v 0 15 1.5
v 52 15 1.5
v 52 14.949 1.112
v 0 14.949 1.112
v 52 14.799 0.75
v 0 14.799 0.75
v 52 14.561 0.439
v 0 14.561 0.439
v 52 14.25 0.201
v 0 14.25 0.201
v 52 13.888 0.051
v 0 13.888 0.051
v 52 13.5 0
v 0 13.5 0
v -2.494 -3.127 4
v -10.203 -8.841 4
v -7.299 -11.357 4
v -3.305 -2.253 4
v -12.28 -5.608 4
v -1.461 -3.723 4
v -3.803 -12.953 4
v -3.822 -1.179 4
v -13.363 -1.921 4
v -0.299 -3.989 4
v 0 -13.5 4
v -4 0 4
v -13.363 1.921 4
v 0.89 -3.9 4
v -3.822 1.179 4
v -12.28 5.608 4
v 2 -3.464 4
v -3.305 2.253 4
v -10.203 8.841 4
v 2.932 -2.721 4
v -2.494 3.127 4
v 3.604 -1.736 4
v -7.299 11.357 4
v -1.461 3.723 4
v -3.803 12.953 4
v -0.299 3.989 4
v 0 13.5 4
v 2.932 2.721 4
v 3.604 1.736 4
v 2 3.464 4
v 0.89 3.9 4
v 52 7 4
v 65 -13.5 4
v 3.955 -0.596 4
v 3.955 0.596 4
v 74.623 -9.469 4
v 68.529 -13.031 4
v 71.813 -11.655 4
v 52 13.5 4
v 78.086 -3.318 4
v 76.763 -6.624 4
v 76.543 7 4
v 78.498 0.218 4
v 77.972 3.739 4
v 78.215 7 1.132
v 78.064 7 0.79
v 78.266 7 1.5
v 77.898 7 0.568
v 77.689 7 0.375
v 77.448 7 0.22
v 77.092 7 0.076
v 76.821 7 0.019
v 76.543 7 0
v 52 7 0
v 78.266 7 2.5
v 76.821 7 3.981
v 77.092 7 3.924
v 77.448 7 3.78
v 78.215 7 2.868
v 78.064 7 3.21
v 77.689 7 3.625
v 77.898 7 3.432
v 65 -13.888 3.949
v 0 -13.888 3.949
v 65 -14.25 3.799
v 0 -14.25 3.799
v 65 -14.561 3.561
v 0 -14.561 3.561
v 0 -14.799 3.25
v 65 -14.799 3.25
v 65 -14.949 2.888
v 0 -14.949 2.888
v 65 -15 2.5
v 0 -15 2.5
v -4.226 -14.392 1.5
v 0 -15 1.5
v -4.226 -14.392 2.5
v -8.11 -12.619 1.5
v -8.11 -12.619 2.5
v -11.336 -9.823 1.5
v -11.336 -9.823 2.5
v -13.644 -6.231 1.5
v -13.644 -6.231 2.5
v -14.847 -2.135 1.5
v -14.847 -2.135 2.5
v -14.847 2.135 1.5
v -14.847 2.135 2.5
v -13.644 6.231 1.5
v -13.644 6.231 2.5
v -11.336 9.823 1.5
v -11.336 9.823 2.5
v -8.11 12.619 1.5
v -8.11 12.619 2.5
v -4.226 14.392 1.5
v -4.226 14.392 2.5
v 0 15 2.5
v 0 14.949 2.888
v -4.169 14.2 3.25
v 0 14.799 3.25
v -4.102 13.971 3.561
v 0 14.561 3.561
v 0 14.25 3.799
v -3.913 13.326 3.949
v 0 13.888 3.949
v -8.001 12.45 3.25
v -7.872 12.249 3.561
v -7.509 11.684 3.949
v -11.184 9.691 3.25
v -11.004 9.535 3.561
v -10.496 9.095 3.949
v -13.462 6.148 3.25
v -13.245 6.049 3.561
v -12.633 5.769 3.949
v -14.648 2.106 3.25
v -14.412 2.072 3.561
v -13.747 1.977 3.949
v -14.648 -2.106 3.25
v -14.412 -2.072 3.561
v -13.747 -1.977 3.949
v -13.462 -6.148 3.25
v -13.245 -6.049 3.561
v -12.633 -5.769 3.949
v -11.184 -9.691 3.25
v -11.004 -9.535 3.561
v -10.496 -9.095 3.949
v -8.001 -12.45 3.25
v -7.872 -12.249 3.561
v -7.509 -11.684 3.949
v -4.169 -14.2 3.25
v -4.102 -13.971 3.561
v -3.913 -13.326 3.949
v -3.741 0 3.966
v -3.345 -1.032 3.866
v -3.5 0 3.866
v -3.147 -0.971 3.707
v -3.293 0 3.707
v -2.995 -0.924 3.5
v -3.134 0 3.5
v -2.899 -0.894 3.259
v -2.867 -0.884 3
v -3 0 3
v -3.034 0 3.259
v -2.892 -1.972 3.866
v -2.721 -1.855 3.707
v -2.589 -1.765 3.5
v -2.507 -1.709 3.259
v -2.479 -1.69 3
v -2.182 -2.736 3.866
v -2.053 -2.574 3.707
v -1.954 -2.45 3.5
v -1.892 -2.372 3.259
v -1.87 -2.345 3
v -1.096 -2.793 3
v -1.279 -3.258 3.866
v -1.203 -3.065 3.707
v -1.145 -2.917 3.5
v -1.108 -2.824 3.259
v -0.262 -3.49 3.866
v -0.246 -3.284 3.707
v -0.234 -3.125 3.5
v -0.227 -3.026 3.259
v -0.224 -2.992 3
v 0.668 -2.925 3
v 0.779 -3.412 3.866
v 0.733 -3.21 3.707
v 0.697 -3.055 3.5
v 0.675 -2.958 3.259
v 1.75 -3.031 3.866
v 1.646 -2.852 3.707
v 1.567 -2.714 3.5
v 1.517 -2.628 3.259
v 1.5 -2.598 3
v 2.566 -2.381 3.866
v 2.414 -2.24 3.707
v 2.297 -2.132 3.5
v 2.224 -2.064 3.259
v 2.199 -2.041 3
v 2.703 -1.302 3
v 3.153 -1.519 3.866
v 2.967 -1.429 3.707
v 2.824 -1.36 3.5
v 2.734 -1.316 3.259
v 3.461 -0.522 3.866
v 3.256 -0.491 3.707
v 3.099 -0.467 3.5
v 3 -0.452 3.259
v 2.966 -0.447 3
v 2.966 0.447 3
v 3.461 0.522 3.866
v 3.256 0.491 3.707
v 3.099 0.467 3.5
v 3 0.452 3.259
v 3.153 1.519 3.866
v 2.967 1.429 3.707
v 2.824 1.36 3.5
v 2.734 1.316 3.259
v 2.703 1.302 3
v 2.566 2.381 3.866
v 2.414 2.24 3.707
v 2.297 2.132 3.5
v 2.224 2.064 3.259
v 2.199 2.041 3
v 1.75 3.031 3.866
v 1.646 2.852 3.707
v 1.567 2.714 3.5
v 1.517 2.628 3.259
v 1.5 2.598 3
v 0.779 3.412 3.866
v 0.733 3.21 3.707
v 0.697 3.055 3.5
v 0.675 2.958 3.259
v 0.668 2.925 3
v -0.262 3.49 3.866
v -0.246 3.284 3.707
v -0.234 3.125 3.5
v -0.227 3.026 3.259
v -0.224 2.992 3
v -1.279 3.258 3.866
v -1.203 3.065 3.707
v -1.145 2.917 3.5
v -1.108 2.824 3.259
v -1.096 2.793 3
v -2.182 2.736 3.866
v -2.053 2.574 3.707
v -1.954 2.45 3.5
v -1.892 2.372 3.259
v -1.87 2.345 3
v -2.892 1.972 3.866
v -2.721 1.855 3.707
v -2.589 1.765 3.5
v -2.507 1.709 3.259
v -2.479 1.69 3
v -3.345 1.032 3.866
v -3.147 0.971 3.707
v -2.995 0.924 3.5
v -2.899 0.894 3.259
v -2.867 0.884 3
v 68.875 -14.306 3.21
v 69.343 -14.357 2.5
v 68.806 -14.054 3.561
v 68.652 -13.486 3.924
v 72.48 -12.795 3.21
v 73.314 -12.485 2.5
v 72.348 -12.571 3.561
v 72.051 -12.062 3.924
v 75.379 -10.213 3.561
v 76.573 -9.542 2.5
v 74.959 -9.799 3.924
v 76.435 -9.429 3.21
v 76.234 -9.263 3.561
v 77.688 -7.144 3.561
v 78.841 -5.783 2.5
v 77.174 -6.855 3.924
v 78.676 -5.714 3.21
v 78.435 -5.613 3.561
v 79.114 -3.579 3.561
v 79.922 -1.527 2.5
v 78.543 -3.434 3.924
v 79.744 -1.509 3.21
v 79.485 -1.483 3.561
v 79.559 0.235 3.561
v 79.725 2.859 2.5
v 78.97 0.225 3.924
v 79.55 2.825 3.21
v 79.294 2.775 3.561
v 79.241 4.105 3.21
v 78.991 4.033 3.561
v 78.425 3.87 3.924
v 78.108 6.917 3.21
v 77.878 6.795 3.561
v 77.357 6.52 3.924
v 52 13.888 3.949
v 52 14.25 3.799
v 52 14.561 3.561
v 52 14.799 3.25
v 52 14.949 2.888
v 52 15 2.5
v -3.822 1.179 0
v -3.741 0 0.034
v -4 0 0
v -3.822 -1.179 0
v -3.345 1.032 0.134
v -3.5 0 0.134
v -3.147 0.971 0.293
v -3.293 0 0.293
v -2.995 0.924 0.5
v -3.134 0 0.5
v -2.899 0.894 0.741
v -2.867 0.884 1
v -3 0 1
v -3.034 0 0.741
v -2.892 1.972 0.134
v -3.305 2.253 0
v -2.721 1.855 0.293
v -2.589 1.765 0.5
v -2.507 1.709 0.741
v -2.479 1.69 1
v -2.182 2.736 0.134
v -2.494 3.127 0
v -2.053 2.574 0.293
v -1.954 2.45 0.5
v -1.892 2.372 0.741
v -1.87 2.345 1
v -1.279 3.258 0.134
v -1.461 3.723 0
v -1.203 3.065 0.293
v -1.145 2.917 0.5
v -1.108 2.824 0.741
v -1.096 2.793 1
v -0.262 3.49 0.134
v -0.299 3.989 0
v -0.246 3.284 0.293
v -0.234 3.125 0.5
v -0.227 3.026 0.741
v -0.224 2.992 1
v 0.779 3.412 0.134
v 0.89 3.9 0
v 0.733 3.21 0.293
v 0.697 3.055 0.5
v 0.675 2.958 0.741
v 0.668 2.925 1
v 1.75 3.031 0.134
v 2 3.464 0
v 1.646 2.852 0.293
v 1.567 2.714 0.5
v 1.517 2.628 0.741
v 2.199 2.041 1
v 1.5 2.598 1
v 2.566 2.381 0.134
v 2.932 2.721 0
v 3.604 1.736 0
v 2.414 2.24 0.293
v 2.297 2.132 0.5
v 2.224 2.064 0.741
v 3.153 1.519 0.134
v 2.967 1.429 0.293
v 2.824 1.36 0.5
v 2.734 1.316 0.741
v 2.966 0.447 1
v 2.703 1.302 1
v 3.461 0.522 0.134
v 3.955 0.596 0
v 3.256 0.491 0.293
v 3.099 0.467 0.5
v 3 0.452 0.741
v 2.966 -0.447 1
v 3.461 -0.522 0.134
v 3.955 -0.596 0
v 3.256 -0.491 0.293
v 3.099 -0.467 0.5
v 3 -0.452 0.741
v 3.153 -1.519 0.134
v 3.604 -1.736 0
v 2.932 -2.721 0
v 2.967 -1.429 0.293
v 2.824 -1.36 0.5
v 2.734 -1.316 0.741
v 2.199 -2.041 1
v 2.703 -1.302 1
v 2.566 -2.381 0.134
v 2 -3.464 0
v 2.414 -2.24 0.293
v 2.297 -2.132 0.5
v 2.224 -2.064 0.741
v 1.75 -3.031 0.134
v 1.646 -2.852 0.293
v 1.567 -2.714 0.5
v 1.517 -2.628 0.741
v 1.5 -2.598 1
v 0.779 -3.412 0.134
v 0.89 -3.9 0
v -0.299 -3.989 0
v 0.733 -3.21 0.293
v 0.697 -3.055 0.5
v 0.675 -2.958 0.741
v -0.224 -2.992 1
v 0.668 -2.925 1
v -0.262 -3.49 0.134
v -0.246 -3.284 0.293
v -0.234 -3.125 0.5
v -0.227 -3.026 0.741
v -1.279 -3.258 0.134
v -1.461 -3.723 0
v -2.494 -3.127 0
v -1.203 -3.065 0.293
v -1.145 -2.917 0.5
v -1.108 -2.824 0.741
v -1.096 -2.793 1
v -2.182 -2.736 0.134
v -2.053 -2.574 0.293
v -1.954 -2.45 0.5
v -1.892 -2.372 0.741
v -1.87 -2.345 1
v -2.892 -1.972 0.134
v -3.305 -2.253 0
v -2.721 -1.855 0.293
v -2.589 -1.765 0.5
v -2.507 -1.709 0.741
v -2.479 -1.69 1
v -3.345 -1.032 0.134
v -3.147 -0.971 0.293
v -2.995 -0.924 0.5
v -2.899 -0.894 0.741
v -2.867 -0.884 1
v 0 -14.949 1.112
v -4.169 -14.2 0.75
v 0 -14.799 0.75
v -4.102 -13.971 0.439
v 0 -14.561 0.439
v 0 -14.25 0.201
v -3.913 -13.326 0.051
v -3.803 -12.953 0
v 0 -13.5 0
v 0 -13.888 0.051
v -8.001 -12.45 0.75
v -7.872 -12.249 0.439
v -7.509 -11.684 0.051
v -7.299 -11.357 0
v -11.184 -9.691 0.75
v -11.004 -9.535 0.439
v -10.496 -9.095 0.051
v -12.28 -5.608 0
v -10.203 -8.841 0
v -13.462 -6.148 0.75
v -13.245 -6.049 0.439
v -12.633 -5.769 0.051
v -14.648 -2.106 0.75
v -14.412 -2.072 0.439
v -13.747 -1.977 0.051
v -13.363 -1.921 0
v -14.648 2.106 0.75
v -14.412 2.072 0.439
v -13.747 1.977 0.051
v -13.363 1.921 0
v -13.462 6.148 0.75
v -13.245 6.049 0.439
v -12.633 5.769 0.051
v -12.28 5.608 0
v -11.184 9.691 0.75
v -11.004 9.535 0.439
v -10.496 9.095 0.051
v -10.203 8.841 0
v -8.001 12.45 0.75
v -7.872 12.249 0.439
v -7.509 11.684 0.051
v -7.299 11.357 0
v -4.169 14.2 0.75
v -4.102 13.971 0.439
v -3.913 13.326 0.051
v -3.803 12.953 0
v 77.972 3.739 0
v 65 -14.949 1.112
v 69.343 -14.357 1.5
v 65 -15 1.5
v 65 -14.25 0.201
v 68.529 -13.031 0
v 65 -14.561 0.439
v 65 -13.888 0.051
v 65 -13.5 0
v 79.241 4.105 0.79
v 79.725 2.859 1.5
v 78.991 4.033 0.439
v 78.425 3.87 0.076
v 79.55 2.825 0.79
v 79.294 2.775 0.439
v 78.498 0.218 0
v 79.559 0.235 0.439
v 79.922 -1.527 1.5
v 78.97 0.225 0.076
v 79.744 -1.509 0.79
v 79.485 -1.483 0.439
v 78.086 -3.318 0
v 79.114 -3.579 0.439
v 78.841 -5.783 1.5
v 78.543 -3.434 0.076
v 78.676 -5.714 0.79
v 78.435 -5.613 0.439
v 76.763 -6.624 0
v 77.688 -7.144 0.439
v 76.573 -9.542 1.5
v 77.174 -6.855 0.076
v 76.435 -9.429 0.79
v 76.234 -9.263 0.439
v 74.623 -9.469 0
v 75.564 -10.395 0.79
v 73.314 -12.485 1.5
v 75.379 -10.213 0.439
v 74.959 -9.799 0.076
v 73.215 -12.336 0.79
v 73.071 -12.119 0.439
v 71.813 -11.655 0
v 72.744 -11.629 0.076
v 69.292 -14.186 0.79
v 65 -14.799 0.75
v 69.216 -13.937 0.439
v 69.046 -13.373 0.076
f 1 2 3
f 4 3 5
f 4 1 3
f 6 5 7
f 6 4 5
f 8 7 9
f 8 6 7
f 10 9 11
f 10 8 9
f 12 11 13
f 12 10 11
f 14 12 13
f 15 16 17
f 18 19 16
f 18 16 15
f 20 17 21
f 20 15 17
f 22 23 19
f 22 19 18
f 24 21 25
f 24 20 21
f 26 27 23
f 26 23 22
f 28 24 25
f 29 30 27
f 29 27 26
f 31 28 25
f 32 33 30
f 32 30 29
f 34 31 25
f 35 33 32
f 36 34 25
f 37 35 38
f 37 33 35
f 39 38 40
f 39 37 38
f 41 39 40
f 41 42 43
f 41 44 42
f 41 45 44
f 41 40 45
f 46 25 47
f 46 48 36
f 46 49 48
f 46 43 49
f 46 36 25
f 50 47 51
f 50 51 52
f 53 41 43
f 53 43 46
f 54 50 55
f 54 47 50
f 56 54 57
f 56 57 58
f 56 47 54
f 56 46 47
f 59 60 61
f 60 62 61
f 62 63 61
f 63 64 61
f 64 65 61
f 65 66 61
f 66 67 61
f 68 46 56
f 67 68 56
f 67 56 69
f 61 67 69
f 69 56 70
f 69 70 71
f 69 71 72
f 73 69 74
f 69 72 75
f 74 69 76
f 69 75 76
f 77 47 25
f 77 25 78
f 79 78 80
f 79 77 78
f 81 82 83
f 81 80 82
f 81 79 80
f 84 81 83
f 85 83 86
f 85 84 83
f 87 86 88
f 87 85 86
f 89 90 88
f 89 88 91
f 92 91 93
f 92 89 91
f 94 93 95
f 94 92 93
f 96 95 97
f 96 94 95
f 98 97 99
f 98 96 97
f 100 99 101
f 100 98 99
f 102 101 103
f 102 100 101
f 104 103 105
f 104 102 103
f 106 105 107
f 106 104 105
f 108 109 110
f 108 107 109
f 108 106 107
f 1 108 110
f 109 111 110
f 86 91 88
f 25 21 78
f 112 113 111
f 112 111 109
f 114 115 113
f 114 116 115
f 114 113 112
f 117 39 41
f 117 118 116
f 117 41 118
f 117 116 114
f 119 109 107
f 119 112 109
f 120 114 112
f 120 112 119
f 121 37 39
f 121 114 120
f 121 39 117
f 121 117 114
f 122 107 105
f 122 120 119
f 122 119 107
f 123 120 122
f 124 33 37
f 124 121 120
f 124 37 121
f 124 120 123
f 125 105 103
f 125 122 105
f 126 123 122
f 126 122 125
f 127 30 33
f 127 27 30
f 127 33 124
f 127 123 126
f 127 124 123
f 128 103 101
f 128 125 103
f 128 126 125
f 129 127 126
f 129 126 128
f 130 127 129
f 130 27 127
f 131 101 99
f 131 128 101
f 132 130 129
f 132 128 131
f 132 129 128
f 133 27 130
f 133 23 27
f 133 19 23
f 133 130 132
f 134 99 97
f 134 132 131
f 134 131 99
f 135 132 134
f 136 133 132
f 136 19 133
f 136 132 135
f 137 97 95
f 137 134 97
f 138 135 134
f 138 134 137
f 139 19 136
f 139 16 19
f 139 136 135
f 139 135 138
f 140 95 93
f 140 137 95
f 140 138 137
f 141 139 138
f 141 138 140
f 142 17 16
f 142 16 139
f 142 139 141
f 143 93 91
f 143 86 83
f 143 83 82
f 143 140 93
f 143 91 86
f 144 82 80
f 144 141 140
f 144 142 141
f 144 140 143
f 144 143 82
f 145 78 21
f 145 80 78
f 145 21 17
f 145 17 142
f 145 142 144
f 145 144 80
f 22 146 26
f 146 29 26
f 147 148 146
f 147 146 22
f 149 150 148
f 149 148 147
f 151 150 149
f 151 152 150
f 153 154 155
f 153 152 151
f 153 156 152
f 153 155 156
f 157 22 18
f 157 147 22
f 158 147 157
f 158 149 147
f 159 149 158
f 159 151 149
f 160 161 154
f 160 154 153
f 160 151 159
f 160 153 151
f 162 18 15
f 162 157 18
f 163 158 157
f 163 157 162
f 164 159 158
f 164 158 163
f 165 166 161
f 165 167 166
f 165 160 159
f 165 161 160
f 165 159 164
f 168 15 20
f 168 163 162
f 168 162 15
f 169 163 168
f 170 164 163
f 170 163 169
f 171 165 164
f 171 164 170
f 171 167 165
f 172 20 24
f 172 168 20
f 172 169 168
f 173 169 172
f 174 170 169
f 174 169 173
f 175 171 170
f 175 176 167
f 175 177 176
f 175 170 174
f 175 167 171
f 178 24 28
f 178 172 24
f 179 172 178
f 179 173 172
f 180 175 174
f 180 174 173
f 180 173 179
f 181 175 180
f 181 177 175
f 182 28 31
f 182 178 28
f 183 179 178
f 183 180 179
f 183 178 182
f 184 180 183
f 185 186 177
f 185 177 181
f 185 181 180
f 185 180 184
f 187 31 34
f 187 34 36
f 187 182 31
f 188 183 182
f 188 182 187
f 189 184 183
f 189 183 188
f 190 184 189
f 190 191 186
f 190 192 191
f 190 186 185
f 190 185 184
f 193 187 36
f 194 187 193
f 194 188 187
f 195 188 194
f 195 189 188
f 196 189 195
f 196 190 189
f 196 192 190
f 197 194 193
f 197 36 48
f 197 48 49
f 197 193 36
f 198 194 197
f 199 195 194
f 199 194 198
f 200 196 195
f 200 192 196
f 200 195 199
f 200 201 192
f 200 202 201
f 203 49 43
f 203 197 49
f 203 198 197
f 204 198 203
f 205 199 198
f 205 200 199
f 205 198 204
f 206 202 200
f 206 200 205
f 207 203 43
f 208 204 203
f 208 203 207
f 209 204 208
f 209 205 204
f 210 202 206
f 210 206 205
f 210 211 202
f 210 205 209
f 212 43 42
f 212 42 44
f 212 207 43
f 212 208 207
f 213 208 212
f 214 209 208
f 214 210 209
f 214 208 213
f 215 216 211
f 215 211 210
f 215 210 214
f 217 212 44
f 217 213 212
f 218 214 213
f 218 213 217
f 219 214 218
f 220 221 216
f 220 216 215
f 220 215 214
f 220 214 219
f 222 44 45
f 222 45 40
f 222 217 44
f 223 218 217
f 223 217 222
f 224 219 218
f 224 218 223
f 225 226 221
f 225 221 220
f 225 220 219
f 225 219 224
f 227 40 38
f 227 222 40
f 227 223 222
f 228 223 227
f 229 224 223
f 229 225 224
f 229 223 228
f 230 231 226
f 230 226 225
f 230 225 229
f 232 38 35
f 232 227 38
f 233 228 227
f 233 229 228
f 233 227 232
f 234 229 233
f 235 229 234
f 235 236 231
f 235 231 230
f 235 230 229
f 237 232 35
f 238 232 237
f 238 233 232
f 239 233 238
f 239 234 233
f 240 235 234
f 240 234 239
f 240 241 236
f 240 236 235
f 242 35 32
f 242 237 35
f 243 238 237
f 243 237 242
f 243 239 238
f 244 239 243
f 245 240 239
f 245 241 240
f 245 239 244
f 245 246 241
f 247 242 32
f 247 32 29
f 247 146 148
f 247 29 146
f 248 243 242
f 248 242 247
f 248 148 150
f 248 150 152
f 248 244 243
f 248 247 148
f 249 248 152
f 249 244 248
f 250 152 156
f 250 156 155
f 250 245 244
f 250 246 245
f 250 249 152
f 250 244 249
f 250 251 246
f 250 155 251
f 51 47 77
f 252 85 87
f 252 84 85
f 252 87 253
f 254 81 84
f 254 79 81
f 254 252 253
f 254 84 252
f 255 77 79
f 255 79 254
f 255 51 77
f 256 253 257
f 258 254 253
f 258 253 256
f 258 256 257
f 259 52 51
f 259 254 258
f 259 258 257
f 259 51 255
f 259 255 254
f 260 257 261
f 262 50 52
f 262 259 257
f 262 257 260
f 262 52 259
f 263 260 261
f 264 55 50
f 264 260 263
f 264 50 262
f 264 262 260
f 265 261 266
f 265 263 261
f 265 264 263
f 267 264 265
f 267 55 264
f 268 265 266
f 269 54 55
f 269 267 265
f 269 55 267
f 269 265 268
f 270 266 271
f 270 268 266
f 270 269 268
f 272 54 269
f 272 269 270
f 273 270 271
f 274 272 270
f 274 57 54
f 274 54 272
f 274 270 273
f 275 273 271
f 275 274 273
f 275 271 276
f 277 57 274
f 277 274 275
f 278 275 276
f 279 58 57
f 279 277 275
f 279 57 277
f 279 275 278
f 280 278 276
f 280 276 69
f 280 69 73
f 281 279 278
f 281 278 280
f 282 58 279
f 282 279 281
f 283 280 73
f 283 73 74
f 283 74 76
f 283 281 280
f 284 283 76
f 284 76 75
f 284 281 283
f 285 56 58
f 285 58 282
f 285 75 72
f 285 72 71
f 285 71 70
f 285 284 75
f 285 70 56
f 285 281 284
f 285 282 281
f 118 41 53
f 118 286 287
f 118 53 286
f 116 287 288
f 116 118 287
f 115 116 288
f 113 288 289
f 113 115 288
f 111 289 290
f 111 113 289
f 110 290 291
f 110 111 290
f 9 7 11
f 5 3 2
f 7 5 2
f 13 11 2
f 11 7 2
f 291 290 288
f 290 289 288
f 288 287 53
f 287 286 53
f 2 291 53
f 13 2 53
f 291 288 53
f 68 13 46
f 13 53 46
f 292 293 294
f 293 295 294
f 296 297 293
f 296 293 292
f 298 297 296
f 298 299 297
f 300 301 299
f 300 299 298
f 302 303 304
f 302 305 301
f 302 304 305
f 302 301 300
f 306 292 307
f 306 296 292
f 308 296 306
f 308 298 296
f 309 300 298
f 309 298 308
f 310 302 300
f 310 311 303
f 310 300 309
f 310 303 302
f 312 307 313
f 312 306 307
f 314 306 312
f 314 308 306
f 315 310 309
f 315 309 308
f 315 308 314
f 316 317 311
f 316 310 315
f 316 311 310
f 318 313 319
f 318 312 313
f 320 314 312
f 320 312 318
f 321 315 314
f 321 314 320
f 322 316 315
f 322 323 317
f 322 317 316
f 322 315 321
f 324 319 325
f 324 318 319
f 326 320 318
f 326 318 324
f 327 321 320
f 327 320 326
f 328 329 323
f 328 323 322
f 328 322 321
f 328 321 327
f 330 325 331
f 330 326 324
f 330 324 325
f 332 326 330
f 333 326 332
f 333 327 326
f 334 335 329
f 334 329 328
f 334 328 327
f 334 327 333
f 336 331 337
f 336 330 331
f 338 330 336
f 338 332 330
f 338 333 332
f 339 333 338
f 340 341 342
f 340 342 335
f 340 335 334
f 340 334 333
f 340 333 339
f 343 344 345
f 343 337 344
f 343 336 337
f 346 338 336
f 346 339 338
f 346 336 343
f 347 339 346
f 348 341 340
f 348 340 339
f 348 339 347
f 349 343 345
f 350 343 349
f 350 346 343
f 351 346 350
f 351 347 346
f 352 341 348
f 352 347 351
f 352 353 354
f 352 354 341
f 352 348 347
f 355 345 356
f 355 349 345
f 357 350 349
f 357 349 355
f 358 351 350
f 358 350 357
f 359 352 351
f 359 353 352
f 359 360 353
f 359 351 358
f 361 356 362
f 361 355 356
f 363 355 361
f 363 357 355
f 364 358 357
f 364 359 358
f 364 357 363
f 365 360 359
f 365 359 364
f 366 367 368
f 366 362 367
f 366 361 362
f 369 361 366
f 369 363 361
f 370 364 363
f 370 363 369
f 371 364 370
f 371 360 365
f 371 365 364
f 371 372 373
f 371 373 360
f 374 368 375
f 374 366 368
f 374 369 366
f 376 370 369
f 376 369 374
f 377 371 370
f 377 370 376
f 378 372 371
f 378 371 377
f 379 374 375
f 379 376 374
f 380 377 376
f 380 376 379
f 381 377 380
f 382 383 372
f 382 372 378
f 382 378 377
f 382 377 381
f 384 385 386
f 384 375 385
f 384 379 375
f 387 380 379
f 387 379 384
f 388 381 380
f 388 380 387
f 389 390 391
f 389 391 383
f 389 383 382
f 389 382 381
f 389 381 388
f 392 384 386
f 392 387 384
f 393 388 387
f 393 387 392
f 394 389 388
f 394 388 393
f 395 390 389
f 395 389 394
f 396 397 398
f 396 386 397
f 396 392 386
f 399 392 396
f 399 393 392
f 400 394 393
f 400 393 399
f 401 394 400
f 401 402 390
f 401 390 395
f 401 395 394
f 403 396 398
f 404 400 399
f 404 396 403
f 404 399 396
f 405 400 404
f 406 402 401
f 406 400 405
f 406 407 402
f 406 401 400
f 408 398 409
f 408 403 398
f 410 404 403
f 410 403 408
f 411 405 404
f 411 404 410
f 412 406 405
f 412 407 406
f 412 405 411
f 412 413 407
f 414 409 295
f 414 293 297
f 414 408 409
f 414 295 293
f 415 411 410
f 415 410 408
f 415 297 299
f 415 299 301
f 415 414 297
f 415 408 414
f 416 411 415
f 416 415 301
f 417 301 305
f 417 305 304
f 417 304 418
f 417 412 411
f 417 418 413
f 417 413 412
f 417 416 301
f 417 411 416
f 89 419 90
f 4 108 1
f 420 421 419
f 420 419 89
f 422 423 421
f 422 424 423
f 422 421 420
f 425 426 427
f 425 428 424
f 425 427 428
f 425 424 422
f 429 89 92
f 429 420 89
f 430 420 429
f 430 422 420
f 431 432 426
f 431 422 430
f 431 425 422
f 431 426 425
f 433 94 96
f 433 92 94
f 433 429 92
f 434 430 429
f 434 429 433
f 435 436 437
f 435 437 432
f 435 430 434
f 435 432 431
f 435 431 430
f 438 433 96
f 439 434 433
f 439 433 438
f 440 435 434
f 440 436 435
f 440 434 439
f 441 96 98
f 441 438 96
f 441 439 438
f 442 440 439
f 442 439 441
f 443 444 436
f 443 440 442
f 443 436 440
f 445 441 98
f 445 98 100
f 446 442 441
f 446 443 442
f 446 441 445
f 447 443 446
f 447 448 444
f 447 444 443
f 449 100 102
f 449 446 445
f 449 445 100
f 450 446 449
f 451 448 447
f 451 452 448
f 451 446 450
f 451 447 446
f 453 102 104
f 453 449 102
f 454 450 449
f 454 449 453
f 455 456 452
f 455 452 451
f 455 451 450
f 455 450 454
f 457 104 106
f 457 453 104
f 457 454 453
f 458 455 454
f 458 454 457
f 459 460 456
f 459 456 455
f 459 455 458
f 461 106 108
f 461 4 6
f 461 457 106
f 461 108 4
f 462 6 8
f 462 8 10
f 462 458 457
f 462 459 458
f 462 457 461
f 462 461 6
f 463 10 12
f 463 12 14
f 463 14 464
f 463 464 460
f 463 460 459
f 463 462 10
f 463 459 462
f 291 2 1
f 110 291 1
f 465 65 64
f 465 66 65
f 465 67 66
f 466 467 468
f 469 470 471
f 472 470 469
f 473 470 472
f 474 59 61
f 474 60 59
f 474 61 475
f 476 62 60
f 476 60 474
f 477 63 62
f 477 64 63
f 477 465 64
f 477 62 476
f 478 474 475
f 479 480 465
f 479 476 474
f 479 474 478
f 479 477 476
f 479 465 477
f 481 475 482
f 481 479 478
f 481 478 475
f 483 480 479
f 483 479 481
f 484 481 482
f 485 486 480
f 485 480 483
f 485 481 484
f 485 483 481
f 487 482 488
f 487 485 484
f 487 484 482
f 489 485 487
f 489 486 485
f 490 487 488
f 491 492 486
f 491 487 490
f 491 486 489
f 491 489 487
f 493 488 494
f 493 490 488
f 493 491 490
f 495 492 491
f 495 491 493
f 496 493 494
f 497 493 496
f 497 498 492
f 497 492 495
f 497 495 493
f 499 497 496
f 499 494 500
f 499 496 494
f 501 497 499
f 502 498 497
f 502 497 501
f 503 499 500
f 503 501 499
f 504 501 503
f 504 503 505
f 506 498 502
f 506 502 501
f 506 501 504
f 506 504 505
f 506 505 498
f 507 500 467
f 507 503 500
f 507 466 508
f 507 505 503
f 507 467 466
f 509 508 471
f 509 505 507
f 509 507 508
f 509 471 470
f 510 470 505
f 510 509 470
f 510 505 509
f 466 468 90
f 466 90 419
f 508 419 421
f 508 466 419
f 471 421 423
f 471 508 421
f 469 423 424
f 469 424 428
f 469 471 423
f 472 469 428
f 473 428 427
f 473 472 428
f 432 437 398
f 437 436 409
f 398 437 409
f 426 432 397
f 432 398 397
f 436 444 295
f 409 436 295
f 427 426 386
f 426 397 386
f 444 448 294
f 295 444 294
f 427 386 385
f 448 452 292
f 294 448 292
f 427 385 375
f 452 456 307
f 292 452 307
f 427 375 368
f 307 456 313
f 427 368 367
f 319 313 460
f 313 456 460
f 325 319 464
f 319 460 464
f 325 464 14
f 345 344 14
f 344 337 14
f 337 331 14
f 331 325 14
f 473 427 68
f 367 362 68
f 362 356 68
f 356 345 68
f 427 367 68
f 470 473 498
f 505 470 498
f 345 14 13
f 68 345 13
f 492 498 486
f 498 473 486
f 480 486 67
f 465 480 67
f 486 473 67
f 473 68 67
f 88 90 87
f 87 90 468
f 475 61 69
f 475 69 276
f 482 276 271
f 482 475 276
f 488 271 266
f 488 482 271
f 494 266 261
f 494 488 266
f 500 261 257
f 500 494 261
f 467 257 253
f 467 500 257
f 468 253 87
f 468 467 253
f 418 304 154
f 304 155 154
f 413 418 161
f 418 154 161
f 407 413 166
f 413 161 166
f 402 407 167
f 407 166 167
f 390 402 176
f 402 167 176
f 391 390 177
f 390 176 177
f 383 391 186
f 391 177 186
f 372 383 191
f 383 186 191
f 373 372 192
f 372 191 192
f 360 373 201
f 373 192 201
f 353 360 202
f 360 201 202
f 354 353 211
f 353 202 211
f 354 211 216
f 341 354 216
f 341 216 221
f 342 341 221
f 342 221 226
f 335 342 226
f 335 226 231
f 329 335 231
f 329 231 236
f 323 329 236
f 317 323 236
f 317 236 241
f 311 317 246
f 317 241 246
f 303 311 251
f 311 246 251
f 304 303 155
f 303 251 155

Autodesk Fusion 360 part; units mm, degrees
sketch "Sketch1" plane through (0, 0, 0) normal (0, 1, 0) x (1, 0, 0)
  line L0 (0, 0) -> (80, 0)
  line L1 (0, 0) -> (0, -65)
  line L2 (0, -65) -> (80, 0)
  dimension "d1" = 80
  dimension "d2" = 65
sketch "Sketch2" plane through (0, 0, 0) normal (0, 0, 1) x (1, 0, 0)
sketch "Sketch3" plane through (0, 0, 0) normal (0, 0, 1) x (1, 0, 0)
sketch "Sketch4" plane through (0, 0, 0) normal (0, 0, 1) x (1, 0, 0)
  line L0 (0, -15) -> (65, -15)
  arc A0 (65, -15) -> (65, 15) centre (65, 0) ccw
  line L1 (65, 15) -> (0, 15)
  arc A1 (0, 15) -> (0, -15) centre (0, 0) ccw
  line L2 (0, 0) -> (65, 0) construction
  dimension "d10" = 65
  dimension "d11" = 30
extrude "Extrude2" add sketch "Sketch4" along normal blind 4
sketch "Sketch5" plane through (0, 0, 4) normal (0, 0, 1) x (-1, 0, 0)
  arc A0 (0, -15) -> (0, 15) centre (0, 0) ccw
  line L0 (0, 15) -> (-65, 15)
  arc A1 (-65, 15) -> (-65, -15) centre (-65, 0) ccw
  line L1 (-65, -15) -> (0, -15)
sketch "Sketch6" plane through (0, 0, 4) normal (0, 0, 1) x (-1, 0, 0)
sketch "Sketch7" plane through (0, 0, 4) normal (0, 0, 1) x (-1, 0, 0)
  line L0 (-80, -15) -> (-52, -15)
  line L1 (-52, -15) -> (-52, -7)
  line L2 (-52, -7) -> (-80, -7)
  line L3 (-80, -7) -> (-80, -15)
  dimension "d18" = 28
  dimension "d19" = 8
extrude "Extrude3" cut sketch "Sketch7" against normal blind 4
sketch "Sketch8" plane through (0, 0, 4) normal (0, 0, 1) x (-1, 0, 0)
  circle A0 centre (0, 0) radius 3
  dimension "d22" = 6
extrude "Extrude4" cut sketch "Sketch8" against normal blind 4
fillet "Fillet1" radius 1.5 8 edges at (26, 15, 4) (-15, 0, 4) (32.5, -15, 4) (77.8452, -7.746, 4) (26, 15, 0) (-15, 0, 0) (32.5, -15, 0) (77.8452, -7.746, 0)
fillet "Fillet2" radius 1 2 edges at (2.797, 1.0848, 0) (2.797, -1.0848, 4)
